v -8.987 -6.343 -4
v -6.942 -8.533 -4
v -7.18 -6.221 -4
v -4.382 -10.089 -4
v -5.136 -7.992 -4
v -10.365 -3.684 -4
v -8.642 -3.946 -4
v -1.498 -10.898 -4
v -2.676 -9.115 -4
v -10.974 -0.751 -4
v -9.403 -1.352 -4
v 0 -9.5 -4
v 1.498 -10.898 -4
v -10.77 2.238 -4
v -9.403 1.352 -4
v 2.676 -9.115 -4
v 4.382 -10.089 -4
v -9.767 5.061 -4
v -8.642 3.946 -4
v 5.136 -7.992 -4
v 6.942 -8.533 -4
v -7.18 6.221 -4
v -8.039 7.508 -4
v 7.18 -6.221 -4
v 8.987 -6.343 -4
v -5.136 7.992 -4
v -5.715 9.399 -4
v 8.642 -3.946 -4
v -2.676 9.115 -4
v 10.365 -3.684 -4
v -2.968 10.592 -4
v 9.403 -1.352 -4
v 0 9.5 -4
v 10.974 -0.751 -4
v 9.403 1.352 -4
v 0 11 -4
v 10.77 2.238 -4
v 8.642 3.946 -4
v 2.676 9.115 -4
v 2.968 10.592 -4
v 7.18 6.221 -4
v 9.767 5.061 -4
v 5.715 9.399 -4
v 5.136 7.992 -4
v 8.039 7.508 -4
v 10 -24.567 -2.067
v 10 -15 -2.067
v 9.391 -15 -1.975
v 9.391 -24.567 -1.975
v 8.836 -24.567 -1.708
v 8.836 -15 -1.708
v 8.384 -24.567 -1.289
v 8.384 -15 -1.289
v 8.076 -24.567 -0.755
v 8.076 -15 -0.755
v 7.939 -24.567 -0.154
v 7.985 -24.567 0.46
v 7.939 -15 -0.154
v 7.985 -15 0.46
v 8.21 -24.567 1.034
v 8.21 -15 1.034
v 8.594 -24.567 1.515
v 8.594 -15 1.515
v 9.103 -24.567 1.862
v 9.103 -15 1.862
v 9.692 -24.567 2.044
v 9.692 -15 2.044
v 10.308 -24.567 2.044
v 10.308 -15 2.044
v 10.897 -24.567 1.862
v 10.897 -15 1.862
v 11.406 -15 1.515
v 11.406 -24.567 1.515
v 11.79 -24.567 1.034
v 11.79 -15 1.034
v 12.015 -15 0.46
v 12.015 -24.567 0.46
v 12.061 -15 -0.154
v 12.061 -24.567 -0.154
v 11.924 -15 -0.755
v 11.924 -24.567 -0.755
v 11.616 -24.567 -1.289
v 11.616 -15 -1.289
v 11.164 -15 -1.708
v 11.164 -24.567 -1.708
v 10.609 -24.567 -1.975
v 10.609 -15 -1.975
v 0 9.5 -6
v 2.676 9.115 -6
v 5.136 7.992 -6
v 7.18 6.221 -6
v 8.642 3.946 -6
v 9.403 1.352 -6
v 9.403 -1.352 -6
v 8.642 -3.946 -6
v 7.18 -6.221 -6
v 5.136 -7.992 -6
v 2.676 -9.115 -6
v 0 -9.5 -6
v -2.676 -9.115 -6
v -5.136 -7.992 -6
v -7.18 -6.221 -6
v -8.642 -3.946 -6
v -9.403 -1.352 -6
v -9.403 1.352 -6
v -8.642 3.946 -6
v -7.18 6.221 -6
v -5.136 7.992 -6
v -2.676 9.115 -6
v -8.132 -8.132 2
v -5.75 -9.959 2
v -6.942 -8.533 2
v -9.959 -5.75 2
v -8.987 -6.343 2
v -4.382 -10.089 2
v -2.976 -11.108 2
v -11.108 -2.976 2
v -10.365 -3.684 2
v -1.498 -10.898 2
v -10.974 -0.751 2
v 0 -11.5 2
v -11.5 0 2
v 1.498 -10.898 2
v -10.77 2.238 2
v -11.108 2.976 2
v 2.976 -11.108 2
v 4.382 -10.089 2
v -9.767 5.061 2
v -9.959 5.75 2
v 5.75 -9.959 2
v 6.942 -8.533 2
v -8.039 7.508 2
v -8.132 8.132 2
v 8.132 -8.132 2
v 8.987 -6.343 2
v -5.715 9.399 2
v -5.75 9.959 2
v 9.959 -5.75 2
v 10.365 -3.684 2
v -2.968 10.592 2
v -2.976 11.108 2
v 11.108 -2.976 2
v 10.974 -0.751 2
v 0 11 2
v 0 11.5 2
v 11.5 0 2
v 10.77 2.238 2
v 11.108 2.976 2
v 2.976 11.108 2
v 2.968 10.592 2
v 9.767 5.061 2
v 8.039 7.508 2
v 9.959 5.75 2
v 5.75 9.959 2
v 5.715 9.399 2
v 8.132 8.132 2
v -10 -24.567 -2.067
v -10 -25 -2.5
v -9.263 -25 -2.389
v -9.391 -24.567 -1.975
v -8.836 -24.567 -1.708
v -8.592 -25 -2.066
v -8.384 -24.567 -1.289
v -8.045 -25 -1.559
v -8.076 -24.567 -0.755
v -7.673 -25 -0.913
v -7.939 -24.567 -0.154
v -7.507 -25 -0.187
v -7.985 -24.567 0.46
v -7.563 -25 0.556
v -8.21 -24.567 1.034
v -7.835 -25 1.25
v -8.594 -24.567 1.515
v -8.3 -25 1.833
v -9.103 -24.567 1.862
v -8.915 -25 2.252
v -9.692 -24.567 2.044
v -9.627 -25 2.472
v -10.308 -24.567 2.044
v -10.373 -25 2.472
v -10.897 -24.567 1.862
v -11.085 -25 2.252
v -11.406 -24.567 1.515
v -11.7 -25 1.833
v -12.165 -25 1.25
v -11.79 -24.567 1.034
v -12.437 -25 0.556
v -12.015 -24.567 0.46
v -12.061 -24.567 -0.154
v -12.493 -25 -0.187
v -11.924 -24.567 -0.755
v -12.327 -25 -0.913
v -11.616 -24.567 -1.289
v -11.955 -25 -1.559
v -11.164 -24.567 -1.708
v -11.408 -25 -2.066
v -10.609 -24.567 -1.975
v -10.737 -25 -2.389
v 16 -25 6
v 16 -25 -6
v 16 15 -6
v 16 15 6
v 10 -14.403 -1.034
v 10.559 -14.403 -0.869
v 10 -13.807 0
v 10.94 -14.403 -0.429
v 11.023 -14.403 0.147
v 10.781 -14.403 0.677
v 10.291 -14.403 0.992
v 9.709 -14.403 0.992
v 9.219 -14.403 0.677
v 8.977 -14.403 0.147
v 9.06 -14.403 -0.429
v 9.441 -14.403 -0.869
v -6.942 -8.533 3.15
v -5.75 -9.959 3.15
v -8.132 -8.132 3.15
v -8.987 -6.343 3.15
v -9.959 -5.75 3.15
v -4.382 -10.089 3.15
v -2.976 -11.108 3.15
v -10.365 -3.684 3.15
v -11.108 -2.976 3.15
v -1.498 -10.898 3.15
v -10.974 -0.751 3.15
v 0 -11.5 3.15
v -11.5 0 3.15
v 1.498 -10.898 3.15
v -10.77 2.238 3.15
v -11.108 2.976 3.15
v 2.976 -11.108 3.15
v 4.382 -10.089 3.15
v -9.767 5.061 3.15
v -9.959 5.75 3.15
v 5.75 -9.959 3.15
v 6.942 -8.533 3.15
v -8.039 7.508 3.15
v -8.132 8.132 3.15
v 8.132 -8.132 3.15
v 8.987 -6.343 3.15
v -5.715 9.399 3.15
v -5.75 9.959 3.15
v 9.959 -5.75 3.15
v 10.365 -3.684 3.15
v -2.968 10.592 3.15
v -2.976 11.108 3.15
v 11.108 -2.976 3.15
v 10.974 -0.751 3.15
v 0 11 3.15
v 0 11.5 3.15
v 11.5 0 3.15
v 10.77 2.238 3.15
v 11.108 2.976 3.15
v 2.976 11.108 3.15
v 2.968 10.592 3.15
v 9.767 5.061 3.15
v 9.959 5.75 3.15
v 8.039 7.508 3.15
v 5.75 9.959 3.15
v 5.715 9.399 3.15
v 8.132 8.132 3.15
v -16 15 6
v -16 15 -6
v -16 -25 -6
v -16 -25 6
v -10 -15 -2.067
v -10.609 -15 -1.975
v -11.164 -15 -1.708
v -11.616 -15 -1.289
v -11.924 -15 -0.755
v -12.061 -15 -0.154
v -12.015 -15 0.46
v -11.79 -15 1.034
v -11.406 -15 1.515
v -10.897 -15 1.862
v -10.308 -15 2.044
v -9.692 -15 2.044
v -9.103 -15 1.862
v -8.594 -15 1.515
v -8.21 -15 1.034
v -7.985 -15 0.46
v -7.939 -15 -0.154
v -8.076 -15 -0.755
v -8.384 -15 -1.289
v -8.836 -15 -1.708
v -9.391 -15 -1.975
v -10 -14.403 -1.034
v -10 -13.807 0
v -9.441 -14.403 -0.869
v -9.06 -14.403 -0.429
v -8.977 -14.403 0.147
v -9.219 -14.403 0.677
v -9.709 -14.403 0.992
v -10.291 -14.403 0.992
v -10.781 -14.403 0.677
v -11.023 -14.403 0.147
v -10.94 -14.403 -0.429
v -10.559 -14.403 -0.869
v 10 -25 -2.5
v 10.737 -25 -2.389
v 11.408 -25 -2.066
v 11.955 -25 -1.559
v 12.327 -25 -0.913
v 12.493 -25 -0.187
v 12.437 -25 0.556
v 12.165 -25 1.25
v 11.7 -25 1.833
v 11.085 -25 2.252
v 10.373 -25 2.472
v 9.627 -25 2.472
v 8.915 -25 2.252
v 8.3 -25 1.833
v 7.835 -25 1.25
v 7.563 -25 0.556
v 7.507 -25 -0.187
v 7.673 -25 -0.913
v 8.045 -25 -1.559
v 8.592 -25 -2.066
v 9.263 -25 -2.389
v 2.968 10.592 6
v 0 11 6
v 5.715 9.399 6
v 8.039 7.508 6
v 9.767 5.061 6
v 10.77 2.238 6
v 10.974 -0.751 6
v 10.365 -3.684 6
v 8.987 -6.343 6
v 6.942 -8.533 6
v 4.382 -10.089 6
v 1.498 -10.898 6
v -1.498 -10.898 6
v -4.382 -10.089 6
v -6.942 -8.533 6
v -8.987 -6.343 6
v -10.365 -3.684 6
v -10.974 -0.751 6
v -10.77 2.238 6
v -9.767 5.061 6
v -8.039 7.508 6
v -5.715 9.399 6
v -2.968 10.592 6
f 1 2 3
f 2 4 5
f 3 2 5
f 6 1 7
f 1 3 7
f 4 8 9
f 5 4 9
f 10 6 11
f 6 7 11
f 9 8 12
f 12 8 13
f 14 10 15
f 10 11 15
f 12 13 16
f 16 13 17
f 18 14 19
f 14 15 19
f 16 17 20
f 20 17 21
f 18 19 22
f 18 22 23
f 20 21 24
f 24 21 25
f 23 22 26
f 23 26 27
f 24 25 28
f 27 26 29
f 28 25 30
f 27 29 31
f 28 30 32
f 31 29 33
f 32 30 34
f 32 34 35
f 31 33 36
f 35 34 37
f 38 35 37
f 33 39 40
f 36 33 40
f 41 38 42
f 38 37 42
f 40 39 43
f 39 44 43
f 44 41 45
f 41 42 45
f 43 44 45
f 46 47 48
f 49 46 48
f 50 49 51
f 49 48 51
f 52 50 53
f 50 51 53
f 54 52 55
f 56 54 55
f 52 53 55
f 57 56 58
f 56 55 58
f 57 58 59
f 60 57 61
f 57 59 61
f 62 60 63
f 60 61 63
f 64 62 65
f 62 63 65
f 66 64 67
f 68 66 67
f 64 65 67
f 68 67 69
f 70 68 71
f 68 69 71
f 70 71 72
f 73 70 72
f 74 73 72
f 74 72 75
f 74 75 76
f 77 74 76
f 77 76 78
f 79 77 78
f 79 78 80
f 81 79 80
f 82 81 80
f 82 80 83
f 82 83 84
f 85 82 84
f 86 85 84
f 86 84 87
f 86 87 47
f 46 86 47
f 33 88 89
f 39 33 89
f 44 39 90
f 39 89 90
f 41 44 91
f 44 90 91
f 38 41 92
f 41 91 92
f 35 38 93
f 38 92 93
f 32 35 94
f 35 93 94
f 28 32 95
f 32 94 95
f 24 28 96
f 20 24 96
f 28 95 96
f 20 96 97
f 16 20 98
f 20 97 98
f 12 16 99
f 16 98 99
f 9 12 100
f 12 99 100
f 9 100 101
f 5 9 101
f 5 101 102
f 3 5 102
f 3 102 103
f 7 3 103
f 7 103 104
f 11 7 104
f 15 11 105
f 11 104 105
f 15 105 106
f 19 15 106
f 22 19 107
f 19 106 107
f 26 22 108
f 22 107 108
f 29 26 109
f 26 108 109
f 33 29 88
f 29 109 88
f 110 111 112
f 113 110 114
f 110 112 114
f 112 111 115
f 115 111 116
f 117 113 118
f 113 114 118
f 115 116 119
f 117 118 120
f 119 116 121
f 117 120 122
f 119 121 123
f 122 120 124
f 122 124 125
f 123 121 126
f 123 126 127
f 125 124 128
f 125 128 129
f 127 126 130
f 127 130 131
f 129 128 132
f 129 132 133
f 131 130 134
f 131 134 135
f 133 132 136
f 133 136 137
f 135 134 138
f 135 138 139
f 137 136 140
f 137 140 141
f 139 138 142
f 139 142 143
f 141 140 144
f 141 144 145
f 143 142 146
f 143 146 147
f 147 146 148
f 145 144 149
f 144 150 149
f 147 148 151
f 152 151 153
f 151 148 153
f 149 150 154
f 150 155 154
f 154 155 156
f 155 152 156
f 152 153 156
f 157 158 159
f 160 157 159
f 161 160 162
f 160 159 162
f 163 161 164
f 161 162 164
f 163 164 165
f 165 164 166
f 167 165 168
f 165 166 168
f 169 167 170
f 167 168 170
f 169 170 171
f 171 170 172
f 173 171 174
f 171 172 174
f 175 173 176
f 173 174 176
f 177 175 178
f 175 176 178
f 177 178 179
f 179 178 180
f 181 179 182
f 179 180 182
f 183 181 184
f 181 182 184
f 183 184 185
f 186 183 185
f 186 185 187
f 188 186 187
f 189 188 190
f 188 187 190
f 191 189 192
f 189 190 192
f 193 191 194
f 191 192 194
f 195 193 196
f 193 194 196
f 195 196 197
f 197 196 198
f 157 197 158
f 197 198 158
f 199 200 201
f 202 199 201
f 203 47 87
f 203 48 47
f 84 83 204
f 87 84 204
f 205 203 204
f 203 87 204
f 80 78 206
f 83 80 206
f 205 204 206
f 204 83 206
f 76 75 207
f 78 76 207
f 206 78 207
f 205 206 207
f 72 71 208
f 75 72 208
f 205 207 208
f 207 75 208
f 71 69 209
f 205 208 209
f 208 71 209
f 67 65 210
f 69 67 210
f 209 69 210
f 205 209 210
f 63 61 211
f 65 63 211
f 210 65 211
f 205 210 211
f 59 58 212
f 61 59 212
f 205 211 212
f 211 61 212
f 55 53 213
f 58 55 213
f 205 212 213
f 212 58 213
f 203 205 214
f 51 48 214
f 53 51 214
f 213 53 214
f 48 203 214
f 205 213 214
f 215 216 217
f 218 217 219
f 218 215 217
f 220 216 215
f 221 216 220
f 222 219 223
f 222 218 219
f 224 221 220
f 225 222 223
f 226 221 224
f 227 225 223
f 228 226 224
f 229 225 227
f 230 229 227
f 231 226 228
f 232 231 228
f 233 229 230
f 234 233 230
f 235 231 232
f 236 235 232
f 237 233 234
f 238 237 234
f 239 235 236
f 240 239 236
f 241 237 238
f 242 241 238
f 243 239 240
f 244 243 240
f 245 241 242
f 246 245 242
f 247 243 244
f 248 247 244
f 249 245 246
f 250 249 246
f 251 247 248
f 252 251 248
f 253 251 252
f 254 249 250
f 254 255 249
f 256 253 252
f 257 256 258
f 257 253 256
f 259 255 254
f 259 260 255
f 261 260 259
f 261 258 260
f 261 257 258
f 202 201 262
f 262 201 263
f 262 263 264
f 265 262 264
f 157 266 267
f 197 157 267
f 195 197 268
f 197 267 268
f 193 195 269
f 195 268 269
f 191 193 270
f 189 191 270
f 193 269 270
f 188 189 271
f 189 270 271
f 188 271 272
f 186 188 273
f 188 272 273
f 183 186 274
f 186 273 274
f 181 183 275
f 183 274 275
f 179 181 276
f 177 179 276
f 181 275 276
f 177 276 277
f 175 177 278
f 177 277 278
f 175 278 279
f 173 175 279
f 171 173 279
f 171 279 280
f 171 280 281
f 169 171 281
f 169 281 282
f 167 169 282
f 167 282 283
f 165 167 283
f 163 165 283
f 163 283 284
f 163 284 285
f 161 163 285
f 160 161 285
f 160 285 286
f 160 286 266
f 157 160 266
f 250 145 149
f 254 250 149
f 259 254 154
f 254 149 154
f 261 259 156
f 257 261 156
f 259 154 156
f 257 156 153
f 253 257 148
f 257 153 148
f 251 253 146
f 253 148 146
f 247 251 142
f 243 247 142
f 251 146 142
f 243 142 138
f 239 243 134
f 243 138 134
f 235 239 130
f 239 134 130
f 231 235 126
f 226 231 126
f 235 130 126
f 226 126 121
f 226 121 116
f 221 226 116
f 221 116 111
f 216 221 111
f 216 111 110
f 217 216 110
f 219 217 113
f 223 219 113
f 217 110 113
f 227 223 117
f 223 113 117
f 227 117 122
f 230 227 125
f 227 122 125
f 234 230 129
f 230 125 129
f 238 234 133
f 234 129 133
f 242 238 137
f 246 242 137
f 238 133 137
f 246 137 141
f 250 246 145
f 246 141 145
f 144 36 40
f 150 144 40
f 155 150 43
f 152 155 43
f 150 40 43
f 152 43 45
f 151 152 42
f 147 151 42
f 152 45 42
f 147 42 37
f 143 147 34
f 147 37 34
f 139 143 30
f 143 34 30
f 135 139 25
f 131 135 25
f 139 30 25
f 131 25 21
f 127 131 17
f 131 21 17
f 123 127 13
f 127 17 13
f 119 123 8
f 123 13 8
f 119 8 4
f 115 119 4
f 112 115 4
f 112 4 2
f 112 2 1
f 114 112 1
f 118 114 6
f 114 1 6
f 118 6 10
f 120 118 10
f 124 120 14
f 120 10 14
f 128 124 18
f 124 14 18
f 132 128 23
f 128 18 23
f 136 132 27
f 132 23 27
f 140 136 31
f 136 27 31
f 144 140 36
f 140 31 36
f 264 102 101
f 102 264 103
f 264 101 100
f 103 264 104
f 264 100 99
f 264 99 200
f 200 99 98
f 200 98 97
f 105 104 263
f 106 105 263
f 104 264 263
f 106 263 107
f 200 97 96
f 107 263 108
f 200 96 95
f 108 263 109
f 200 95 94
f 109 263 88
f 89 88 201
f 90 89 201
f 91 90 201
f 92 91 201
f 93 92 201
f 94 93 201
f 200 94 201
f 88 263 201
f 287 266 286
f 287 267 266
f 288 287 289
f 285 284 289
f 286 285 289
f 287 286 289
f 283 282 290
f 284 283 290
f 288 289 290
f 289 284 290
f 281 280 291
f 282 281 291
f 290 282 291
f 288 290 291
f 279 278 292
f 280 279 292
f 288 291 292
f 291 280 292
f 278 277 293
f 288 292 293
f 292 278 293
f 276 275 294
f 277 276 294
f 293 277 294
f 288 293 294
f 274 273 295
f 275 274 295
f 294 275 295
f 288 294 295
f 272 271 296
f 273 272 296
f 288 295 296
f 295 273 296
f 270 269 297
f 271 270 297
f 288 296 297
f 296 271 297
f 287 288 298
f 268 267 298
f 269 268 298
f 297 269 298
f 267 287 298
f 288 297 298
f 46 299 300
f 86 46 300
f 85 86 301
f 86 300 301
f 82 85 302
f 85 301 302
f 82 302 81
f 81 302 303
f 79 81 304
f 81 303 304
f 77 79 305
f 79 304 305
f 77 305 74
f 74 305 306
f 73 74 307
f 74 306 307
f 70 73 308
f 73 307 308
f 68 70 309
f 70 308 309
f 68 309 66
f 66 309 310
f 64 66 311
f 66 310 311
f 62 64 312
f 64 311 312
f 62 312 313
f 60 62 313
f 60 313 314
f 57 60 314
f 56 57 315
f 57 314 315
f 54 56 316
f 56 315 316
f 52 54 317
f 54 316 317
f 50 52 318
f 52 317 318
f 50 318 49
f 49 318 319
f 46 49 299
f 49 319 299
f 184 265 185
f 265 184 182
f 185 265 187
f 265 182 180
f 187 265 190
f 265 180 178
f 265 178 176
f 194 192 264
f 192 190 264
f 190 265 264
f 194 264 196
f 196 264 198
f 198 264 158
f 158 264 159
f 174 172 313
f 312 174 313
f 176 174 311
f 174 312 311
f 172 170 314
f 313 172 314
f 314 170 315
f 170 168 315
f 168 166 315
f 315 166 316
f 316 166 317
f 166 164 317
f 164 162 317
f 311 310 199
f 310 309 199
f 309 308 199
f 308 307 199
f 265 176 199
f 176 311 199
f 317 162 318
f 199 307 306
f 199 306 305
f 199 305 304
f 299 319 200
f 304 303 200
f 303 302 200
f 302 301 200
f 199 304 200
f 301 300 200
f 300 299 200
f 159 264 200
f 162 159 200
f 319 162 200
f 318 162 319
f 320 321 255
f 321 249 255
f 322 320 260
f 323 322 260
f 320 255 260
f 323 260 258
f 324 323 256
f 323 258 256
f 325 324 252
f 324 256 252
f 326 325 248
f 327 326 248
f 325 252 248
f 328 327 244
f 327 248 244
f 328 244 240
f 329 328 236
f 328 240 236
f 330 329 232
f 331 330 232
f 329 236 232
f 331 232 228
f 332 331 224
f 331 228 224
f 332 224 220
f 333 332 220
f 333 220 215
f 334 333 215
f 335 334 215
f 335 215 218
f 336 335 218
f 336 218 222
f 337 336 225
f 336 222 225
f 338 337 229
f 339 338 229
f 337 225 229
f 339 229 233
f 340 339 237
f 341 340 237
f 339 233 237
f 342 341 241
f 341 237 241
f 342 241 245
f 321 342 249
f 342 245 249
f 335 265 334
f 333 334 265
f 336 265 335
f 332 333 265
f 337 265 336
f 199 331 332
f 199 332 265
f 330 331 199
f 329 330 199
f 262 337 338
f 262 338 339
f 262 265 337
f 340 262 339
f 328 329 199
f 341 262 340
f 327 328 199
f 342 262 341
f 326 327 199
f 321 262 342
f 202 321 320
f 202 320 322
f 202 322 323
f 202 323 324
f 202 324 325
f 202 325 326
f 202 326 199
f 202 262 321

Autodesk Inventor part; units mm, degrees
sketch "_____1" plane through (0, 0, 0) normal (0, 0, 1) x (1, 0, 0)
  line L0 (-16, 15) -> (-16, -25)
  line L1 (-16, -25) -> (16, -25)
  line L2 (16, -25) -> (16, 15)
  line L3 (16, 15) -> (-16, 15)
extrude "Extrusion1" add sketch "_____1" along normal mid plane 12
sketch "Sketch_2" plane through (0, 0, 0) normal (1, 0, 0) x (0, 1, 0)
  line L0 (0, -6) -> (0, 6)
  line L1 (0, 6) -> (11, 6)
  line L2 (11, 6) -> (11, 3.15)
  line L3 (11, 3.15) -> (11.5, 3.15)
  line L4 (11.5, 3.15) -> (11.5, 2)
  line L5 (11.5, 2) -> (11, 2)
  line L6 (11, 2) -> (11, -4)
  line L7 (11, -4) -> (9.5, -4)
  line L8 (9.5, -4) -> (9.5, -6)
  line L9 (9.5, -6) -> (0, -6)
  line L10 (0, -6) -> (0, 6)
revolve "Revolution1" cut sketch "Sketch_2" angle 360 about axis through (0, 0, -6) along (0, 0, -1)
sketch "Sketch3" plane through (-16, -25, 6) normal (0, -1, 0) x (1, 0, 0)
  point P0 (6, -6)
hole "Hole1" at (-10, -25, 0) direction (0, 1, 0) diameter 4.134 depth 10 tip angle 120 countersink diameter 5 countersink angle 90 thread size "M5x0.8" class "6H" standard "ISO Metric profile"
pattern_linear "Rectangular Pattern1" count 2 spacing 20 along (1, 0, 0) of "Hole1"
ref_plane "to_bearing_XY" through (0, 0, -4) normal (0, 0, -1) x (1, 0, 0)
ref_plane "to_bearing_YZ" through (0, 0, -4) normal (1, 0, 0) x (0, -1, 0)
ref_plane "to_bearing_ZX" through (0, 0, -4) normal (0, -1, 0) x (0, 0, -1)
ref_plane "to_ring_XY" through (0, 0, 2) normal (0, 0, -1) x (1, 0, 0)
ref_plane "to_ring_YZ" through (0, 0, 2) normal (1, 0, 0) x (0, -1, 0)
ref_plane "to_ring_ZX" through (0, 0, 2) normal (0, -1, 0) x (0, 0, -1)
properties part number "BGBFS6900DD-25-_h"
